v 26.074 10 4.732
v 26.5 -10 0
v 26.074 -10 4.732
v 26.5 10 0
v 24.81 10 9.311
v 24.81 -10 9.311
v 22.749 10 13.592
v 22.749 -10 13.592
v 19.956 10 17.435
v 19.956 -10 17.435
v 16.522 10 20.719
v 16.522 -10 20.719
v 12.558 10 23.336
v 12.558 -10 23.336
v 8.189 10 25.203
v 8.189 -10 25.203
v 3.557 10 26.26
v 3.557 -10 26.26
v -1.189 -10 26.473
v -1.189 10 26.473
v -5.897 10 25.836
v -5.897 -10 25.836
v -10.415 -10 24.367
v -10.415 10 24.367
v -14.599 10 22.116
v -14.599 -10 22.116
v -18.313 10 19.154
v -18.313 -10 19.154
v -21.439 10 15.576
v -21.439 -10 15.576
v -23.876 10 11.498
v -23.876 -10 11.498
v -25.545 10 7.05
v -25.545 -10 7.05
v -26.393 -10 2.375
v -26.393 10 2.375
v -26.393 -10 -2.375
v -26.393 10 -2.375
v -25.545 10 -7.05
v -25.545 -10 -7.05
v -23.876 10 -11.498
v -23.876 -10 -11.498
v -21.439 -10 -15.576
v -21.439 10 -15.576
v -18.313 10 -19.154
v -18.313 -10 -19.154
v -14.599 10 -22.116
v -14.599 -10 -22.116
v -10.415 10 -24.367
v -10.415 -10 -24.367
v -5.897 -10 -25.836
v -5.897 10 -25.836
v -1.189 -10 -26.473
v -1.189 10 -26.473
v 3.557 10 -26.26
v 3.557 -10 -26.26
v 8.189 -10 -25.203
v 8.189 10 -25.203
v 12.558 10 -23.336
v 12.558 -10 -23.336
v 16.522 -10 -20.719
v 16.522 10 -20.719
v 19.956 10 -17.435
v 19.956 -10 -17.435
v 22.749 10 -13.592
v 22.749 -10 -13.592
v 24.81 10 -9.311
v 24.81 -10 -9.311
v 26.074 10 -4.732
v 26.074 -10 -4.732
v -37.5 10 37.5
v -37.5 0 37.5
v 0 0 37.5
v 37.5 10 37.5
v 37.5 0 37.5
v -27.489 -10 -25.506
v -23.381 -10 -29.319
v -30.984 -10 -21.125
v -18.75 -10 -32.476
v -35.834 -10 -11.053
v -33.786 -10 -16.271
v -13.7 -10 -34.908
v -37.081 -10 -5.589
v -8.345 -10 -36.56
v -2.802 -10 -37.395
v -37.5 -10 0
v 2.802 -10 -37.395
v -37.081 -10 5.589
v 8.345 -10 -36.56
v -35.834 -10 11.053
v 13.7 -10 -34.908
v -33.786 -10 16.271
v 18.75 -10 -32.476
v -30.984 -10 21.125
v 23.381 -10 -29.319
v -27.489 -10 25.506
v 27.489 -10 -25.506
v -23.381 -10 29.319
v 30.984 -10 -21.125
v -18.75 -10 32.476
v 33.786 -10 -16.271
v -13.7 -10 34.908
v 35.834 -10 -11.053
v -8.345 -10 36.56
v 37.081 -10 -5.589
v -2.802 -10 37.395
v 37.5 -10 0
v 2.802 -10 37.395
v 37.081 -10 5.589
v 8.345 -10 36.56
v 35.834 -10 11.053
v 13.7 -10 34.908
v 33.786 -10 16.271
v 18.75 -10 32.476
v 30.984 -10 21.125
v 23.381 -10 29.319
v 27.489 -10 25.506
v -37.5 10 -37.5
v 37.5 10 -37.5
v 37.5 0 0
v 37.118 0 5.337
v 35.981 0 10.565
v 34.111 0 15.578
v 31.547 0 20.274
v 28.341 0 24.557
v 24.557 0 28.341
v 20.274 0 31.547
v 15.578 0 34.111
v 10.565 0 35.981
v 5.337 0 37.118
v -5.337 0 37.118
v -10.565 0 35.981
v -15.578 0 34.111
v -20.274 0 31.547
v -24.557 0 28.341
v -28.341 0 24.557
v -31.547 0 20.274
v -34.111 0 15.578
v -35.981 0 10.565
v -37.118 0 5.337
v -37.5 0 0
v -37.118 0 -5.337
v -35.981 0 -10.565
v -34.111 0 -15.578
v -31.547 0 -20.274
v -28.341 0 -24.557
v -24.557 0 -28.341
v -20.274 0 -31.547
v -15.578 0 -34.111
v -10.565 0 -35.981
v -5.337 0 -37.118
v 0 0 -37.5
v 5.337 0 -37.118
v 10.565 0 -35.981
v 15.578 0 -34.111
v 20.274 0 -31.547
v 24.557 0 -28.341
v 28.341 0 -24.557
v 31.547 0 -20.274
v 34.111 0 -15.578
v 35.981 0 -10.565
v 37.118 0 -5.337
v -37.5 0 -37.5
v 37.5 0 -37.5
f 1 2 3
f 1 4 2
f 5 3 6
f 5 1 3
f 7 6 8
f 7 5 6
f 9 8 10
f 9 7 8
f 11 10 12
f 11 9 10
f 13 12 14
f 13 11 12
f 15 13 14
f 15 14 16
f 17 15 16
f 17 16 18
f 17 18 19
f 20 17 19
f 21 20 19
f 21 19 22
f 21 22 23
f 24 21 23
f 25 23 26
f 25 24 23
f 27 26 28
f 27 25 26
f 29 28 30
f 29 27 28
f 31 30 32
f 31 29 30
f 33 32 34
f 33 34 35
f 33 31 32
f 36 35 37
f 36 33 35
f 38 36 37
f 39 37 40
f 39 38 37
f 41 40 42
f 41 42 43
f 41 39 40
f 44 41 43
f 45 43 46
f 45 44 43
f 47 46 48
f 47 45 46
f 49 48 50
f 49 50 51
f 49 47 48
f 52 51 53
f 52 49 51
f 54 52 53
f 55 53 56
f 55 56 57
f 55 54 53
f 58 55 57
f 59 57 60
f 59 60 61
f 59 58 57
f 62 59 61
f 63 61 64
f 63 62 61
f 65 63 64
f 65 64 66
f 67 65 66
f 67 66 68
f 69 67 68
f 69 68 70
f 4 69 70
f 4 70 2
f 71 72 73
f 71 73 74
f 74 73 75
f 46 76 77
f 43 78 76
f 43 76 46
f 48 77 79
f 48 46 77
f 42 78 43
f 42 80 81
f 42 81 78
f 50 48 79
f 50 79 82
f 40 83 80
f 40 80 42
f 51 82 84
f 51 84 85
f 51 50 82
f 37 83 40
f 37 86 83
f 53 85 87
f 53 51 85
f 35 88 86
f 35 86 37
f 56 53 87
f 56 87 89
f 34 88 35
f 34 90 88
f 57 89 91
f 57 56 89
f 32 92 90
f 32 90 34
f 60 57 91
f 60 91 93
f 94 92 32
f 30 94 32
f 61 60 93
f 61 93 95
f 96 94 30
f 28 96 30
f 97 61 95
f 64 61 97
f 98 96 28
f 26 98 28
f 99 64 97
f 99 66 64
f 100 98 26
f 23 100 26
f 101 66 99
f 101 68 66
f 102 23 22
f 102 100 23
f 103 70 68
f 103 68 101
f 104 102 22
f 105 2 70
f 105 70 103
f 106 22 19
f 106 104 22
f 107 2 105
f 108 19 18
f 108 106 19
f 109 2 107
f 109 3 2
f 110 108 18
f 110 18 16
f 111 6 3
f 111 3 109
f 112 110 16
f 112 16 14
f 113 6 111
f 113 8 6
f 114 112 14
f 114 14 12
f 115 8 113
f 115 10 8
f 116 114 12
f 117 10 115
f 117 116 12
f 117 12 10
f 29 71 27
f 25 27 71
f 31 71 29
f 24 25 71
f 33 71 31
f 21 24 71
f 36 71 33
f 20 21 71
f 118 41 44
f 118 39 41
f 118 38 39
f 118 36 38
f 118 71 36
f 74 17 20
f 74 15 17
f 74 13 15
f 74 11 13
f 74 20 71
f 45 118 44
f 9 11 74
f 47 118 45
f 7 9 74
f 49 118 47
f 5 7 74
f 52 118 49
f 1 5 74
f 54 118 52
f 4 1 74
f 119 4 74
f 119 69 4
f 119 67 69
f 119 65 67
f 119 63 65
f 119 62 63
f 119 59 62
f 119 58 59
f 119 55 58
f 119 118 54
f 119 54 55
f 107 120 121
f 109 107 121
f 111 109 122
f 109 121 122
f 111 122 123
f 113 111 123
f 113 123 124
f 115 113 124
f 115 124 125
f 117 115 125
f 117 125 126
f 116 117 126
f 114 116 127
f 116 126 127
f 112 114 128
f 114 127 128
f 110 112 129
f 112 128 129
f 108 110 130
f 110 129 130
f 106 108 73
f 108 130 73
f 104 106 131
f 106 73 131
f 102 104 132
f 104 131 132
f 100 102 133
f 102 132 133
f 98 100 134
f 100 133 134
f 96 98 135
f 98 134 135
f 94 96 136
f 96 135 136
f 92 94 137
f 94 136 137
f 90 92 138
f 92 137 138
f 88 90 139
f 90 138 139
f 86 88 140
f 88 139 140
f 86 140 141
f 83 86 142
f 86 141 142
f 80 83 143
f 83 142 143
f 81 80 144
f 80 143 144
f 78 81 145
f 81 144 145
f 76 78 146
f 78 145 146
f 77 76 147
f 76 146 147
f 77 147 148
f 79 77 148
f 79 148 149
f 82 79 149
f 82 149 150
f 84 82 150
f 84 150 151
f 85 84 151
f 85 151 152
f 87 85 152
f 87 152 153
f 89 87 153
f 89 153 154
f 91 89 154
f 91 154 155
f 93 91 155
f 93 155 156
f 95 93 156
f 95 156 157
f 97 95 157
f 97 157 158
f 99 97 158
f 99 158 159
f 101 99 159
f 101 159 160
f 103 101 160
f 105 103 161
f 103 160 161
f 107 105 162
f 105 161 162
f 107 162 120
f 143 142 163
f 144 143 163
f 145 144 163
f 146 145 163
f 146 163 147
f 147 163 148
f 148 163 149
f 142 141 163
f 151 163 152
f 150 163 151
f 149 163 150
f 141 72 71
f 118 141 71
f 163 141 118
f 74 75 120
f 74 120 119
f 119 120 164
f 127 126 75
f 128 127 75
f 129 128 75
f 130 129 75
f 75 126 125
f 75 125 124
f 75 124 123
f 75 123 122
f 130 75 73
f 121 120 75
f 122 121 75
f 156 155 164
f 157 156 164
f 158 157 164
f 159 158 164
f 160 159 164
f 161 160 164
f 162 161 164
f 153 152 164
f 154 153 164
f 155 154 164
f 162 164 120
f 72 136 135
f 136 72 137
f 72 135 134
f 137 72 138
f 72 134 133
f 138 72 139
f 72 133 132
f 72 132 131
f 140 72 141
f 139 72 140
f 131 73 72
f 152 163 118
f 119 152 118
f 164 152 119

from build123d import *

# Parameters (mm, degrees)
SKETCH1_W           = 75
SKETCH1_H           = 75
SKETCH1_R           = 26.5
BOSS_EXTRUDE1_DEPTH = 10
SKETCH2_R           = 37.5
SKETCH2_R_2         = 26.5
BOSS_EXTRUDE2_DEPTH = 10


with BuildPart() as part:
    # Sketch1 → Boss-Extrude1 (new body)
    with BuildSketch(Plane(origin=(0, 0, 0), x_dir=(1, 0, 0), z_dir=(0, 1, 0))):
        Rectangle(SKETCH1_W, SKETCH1_H)
        Circle(SKETCH1_R, mode=Mode.SUBTRACT)
    extrude(amount=BOSS_EXTRUDE1_DEPTH)

    # Sketch2 → Boss-Extrude2 (add)
    with BuildSketch(Plane.XZ):
        Circle(SKETCH2_R)
        Circle(SKETCH2_R_2, mode=Mode.SUBTRACT)
    extrude(amount=BOSS_EXTRUDE2_DEPTH)


solid = part.part
